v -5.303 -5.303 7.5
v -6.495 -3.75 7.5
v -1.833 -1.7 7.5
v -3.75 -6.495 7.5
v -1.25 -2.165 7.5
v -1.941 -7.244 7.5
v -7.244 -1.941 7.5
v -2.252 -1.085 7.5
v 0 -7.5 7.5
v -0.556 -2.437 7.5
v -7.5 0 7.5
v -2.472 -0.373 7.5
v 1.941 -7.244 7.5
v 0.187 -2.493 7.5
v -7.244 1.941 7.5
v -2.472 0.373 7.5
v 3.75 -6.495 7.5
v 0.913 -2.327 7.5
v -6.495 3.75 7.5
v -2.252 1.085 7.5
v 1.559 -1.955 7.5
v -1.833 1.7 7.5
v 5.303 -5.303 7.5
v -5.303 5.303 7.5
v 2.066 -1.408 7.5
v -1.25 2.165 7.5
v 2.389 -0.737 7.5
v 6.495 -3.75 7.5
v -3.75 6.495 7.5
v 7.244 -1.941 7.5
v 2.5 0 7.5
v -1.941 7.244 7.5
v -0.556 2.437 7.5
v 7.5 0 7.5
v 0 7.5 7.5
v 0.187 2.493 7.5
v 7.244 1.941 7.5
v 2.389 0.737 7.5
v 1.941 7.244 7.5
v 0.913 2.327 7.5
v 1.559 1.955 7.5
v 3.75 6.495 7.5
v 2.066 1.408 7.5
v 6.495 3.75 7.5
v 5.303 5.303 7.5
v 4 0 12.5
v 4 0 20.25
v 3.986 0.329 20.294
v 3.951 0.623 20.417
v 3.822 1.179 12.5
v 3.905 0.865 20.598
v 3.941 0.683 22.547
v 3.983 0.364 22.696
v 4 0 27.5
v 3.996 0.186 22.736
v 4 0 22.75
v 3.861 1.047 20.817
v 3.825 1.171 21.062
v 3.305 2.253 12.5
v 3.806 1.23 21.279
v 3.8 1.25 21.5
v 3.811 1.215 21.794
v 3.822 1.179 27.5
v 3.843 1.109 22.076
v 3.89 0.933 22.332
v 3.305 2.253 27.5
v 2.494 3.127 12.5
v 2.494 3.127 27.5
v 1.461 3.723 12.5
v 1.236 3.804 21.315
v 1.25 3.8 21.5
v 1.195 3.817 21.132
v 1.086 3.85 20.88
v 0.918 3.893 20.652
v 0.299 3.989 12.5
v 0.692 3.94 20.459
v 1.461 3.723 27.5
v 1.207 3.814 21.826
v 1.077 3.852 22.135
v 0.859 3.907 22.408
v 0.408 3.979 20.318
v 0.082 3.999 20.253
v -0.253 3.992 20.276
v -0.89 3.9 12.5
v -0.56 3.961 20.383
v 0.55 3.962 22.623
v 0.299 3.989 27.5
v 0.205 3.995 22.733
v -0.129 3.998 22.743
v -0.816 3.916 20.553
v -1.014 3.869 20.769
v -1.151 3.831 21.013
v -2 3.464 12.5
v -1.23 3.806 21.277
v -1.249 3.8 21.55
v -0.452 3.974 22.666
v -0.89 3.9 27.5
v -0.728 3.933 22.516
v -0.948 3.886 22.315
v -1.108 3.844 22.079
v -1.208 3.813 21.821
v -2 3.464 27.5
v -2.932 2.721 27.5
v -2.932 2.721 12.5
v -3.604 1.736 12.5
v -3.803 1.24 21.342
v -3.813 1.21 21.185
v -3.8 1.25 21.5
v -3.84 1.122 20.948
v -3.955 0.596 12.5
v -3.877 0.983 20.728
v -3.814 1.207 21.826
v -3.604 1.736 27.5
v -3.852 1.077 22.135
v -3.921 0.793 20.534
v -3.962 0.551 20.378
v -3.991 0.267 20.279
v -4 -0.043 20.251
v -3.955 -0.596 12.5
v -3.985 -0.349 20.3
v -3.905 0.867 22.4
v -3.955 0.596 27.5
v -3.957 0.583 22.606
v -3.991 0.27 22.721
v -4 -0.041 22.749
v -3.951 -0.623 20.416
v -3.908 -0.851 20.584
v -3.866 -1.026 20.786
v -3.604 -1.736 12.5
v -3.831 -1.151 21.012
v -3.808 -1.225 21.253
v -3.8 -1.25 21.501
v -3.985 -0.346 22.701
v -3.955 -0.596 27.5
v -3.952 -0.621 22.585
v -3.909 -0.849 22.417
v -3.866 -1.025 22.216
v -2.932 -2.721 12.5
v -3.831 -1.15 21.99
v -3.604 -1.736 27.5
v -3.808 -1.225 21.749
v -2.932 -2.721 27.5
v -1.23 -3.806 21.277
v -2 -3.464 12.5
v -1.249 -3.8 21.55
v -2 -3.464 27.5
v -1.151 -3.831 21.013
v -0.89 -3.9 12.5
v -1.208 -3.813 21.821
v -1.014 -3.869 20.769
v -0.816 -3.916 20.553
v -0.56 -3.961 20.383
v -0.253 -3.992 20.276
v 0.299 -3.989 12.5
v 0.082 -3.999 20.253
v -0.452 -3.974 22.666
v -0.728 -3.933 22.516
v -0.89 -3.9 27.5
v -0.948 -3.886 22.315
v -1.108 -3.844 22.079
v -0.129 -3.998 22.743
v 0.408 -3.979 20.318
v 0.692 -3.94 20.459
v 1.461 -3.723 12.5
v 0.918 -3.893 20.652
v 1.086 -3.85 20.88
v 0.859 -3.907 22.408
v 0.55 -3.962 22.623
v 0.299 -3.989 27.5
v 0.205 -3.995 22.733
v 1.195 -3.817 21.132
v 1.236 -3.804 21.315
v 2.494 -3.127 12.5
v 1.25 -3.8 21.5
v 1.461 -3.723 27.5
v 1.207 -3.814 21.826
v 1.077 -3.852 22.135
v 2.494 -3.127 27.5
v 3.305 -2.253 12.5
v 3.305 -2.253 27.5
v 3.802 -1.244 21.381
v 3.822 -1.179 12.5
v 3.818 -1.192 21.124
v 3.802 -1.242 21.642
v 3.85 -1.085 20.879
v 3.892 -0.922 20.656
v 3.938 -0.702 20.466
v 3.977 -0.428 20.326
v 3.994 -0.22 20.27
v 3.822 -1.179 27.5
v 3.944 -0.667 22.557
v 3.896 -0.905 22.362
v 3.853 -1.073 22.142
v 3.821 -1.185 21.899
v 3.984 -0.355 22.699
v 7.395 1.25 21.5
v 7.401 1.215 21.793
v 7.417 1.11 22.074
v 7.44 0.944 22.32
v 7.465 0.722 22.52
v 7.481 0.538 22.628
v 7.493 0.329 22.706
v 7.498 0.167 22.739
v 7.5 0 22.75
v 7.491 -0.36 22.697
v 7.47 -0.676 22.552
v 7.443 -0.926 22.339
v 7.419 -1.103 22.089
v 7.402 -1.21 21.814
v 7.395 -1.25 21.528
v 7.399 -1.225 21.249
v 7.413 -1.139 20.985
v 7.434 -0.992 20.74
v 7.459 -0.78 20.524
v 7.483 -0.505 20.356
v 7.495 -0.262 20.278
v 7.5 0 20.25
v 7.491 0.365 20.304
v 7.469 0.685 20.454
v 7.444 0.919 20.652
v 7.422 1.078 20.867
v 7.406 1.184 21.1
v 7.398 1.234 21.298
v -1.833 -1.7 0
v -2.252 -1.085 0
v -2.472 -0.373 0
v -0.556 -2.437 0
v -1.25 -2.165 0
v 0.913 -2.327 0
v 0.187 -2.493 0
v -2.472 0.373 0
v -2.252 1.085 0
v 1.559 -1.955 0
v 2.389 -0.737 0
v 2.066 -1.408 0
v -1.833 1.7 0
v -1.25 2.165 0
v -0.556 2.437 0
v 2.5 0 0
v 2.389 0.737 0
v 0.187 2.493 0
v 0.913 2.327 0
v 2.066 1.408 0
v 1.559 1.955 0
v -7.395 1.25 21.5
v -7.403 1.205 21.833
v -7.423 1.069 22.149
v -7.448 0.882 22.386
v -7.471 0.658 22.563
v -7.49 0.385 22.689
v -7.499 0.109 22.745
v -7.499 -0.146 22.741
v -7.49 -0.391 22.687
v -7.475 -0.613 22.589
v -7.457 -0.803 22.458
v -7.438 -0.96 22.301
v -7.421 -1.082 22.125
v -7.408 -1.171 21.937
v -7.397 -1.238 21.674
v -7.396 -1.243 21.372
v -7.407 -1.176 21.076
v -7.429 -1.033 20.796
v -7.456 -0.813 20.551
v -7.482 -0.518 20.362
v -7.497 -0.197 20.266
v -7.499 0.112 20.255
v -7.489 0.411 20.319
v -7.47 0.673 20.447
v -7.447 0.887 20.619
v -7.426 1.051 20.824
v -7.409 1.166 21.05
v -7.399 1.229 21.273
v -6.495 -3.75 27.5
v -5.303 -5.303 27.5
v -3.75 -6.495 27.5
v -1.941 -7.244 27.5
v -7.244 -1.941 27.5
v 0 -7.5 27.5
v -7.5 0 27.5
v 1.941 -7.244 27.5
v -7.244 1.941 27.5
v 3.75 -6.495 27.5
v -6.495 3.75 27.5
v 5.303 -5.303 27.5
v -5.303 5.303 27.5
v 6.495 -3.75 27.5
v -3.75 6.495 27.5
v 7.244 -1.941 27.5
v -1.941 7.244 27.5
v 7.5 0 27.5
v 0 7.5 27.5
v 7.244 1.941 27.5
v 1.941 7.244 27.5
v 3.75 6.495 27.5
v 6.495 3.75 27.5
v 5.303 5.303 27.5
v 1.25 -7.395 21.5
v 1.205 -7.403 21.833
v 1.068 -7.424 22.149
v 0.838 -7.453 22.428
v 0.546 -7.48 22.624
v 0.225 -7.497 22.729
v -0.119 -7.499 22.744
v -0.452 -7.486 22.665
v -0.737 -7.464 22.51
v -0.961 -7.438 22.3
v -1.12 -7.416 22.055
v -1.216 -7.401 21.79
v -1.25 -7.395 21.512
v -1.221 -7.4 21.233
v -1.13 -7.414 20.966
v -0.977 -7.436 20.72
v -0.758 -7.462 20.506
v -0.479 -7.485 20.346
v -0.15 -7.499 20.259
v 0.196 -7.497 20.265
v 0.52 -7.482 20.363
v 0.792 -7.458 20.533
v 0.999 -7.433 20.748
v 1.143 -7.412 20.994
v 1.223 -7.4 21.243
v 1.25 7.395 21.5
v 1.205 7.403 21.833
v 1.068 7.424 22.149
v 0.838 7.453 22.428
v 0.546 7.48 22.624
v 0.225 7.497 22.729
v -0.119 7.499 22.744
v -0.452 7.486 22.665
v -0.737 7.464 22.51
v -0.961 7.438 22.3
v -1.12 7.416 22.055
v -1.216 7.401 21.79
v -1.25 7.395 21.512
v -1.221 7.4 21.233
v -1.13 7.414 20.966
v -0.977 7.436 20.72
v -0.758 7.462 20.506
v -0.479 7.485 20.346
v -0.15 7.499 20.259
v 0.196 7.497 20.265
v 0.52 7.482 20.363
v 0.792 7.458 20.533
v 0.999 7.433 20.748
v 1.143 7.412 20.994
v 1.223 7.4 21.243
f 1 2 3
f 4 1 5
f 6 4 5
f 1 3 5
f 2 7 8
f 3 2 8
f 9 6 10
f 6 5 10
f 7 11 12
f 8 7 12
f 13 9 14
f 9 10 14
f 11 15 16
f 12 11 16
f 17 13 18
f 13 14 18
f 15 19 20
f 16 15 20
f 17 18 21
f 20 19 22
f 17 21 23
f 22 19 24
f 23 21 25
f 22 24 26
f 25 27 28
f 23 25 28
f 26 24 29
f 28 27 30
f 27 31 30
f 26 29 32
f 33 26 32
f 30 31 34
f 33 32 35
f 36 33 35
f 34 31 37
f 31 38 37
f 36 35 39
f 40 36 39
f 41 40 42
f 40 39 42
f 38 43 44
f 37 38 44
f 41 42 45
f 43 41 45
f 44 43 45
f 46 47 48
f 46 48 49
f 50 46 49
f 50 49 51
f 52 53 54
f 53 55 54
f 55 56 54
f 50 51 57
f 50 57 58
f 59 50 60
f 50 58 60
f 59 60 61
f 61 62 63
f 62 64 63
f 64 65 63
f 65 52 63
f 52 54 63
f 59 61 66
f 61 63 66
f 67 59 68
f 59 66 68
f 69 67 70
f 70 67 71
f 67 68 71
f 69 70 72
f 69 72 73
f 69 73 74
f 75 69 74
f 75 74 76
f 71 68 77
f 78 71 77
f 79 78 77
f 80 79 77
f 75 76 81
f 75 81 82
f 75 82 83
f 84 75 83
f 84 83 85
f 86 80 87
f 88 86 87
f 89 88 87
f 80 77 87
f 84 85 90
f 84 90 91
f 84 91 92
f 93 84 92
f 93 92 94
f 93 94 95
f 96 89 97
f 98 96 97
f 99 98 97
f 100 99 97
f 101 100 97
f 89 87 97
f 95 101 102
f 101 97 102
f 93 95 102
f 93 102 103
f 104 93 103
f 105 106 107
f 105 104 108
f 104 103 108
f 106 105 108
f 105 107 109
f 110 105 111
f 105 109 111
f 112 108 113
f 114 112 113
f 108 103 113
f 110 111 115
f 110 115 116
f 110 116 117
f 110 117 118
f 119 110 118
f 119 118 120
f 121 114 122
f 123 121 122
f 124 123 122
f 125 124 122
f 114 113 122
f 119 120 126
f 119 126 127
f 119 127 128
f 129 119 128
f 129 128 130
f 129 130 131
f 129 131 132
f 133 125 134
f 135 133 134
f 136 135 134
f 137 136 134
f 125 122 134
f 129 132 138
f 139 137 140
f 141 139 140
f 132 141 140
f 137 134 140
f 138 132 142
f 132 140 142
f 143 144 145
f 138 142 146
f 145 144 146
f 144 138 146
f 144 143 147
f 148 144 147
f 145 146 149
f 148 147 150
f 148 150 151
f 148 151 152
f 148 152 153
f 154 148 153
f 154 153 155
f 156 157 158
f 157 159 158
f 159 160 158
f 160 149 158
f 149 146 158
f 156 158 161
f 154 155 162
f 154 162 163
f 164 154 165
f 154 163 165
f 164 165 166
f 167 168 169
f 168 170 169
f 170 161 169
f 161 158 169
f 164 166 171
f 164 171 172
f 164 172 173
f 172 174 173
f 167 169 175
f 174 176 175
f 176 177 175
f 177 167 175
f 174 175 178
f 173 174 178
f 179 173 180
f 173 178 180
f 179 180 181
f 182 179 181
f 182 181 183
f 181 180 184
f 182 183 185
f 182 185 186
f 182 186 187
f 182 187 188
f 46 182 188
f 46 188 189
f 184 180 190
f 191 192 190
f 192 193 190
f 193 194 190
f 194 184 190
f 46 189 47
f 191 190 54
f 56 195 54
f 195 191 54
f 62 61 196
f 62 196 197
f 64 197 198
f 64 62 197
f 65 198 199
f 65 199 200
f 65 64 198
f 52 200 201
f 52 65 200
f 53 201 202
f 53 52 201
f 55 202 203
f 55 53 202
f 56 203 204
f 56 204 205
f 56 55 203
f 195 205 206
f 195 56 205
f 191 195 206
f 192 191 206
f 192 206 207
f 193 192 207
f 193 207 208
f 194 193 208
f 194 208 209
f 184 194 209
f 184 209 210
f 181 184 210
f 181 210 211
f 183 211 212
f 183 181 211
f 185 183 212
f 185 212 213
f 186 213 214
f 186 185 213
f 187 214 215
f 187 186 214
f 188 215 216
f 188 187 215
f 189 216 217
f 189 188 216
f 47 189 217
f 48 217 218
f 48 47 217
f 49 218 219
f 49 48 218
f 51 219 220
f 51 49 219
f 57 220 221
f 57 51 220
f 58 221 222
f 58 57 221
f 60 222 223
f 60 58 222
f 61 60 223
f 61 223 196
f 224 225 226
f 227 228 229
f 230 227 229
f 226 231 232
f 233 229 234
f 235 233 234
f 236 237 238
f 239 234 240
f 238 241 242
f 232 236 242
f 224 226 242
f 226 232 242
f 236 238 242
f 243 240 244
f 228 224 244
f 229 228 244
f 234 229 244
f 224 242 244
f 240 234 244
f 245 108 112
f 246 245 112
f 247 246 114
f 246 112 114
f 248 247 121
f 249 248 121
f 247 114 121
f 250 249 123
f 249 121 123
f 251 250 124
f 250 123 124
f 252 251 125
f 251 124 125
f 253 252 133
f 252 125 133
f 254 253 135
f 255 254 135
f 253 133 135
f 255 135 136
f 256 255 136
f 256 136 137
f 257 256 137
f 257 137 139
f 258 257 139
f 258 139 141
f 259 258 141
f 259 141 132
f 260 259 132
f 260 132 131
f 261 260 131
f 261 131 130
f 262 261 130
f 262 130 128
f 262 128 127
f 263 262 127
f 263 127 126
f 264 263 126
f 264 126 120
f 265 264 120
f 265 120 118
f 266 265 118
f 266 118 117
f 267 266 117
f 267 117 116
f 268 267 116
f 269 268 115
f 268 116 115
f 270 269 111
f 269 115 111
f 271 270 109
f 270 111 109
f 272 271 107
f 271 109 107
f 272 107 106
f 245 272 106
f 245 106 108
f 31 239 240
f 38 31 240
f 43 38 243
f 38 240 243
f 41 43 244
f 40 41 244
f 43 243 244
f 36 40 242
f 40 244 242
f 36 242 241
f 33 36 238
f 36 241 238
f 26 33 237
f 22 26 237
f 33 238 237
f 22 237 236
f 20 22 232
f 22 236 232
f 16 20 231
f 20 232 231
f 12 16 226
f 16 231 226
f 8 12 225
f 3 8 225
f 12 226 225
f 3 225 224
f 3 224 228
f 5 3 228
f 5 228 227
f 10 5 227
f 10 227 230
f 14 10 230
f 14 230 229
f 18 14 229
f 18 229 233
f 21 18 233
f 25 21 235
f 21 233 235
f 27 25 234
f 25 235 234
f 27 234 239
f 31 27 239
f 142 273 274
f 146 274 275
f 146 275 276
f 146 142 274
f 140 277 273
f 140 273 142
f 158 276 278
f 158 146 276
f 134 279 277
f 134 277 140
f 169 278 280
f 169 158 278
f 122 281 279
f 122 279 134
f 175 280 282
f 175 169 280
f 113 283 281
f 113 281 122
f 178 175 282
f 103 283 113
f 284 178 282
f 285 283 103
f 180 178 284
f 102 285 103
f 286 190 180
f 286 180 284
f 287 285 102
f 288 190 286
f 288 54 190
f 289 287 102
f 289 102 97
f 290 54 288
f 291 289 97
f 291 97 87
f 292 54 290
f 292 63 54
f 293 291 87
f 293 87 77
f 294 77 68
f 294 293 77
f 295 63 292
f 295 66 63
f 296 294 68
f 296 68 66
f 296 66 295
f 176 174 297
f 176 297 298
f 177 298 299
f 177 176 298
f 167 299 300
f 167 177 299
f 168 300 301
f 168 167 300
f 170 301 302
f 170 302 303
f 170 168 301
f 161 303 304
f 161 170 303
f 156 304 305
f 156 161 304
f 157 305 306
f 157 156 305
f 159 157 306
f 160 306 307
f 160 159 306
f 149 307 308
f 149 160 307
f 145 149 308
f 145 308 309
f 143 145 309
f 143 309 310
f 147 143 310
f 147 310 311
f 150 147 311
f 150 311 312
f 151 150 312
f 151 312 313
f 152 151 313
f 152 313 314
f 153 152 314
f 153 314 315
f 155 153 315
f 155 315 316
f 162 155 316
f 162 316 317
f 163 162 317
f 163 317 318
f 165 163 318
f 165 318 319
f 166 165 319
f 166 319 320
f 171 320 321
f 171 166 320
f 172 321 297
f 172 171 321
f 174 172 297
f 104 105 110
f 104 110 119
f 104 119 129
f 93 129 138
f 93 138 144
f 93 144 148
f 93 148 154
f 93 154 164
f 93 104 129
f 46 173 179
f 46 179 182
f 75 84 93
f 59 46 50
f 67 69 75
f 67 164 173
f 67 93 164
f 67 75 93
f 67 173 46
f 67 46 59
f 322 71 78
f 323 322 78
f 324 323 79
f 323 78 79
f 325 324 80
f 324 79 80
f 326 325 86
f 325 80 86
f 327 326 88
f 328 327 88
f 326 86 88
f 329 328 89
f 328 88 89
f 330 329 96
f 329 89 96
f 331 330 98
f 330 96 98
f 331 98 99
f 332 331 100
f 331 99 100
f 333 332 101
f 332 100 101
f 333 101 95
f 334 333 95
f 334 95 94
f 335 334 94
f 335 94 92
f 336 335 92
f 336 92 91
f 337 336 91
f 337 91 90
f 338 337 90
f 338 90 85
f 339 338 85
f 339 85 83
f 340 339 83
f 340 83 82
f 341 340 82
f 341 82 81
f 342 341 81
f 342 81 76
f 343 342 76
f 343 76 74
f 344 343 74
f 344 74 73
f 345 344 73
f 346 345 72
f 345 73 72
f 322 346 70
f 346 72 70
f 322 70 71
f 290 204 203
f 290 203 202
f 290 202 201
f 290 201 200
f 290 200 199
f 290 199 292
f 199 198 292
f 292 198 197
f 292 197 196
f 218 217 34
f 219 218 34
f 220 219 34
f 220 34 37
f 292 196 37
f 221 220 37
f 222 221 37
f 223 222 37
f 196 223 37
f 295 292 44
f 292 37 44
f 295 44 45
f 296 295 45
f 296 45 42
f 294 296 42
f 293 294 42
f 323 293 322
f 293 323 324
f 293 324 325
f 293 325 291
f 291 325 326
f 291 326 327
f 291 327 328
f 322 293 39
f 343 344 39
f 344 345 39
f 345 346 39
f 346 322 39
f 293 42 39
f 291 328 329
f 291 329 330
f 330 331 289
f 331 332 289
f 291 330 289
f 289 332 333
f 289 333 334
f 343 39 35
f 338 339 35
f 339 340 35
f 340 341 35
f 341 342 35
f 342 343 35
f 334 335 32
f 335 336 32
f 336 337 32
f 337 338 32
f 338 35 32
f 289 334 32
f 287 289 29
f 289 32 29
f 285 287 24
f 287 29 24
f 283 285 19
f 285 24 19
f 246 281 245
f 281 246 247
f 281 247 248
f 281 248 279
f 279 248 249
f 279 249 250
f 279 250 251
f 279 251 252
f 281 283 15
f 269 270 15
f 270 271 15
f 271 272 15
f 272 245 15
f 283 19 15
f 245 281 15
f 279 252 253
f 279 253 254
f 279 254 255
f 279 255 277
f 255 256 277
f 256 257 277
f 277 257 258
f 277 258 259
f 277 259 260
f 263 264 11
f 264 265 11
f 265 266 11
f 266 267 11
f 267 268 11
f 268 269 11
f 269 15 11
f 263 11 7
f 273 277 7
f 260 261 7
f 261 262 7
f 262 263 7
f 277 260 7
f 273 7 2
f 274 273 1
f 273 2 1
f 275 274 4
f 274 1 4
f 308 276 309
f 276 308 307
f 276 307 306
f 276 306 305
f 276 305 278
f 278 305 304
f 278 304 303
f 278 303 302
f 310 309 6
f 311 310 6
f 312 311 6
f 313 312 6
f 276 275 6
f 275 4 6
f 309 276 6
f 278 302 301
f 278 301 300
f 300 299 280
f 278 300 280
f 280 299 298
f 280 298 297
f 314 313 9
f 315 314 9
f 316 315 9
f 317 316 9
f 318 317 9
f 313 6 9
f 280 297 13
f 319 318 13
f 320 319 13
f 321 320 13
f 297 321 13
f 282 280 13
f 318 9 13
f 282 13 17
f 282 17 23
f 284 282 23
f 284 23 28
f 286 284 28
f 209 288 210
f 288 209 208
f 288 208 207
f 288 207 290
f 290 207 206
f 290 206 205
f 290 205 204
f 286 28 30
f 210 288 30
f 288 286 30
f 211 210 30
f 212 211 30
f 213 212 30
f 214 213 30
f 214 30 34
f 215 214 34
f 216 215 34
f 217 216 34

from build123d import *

# Parameters (mm, degrees)
F0_R           = 2.5
F1_DEPTH       = 7.5
F2_R           = 7.5
F3_DEPTH       = 15
F4_DEPTH       = 20
F5_R           = 4
F6_DEPTH       = 15
F7_R           = 1.25
F8_DEPTH       = 7.501
F8_DEPTH_BACK  = 7.501
F9_R           = 1.25
F10_DEPTH      = 7.5010001
F10_DEPTH_BACK = 7.5010001


with BuildPart() as f1:
    # F0 (on Top) → F1 (new body)
    with BuildSketch(Plane.XY):
        Circle(F0_R)
    extrude(amount=F1_DEPTH)

    # F2 (on face) → F3 (join)
    with BuildSketch(Plane.XY.offset(7.5)):
        Circle(F2_R)
    extrude(amount=F3_DEPTH)

    # F2 (on face) → F4 (join)
    with BuildSketch(Plane.XY.offset(7.5)):
        Circle(F2_R)
    extrude(amount=F4_DEPTH)

    # F5 (on face) → F6 (cut)
    with BuildSketch(Plane.XY.offset(27.5)):
        Circle(F5_R)
    extrude(amount=-F6_DEPTH, mode=Mode.SUBTRACT)

    # F7 (on Front) → F8 (cut, two sides)
    with BuildSketch(Plane.XZ) as f8_sk:
        with Locations((0, 21.5)):
            Circle(F7_R)
    extrude(amount=-F8_DEPTH, mode=Mode.SUBTRACT)
    extrude(f8_sk.sketch, amount=F8_DEPTH_BACK, mode=Mode.SUBTRACT)

    # F9 (on Right) → F10 (cut, two sides)
    with BuildSketch(Plane.YZ) as f10_sk:
        with Locations((0, 21.5)):
            Circle(F9_R)
    extrude(amount=-F10_DEPTH, mode=Mode.SUBTRACT)
    extrude(f10_sk.sketch, amount=F10_DEPTH_BACK, mode=Mode.SUBTRACT)


solid = f1.part
